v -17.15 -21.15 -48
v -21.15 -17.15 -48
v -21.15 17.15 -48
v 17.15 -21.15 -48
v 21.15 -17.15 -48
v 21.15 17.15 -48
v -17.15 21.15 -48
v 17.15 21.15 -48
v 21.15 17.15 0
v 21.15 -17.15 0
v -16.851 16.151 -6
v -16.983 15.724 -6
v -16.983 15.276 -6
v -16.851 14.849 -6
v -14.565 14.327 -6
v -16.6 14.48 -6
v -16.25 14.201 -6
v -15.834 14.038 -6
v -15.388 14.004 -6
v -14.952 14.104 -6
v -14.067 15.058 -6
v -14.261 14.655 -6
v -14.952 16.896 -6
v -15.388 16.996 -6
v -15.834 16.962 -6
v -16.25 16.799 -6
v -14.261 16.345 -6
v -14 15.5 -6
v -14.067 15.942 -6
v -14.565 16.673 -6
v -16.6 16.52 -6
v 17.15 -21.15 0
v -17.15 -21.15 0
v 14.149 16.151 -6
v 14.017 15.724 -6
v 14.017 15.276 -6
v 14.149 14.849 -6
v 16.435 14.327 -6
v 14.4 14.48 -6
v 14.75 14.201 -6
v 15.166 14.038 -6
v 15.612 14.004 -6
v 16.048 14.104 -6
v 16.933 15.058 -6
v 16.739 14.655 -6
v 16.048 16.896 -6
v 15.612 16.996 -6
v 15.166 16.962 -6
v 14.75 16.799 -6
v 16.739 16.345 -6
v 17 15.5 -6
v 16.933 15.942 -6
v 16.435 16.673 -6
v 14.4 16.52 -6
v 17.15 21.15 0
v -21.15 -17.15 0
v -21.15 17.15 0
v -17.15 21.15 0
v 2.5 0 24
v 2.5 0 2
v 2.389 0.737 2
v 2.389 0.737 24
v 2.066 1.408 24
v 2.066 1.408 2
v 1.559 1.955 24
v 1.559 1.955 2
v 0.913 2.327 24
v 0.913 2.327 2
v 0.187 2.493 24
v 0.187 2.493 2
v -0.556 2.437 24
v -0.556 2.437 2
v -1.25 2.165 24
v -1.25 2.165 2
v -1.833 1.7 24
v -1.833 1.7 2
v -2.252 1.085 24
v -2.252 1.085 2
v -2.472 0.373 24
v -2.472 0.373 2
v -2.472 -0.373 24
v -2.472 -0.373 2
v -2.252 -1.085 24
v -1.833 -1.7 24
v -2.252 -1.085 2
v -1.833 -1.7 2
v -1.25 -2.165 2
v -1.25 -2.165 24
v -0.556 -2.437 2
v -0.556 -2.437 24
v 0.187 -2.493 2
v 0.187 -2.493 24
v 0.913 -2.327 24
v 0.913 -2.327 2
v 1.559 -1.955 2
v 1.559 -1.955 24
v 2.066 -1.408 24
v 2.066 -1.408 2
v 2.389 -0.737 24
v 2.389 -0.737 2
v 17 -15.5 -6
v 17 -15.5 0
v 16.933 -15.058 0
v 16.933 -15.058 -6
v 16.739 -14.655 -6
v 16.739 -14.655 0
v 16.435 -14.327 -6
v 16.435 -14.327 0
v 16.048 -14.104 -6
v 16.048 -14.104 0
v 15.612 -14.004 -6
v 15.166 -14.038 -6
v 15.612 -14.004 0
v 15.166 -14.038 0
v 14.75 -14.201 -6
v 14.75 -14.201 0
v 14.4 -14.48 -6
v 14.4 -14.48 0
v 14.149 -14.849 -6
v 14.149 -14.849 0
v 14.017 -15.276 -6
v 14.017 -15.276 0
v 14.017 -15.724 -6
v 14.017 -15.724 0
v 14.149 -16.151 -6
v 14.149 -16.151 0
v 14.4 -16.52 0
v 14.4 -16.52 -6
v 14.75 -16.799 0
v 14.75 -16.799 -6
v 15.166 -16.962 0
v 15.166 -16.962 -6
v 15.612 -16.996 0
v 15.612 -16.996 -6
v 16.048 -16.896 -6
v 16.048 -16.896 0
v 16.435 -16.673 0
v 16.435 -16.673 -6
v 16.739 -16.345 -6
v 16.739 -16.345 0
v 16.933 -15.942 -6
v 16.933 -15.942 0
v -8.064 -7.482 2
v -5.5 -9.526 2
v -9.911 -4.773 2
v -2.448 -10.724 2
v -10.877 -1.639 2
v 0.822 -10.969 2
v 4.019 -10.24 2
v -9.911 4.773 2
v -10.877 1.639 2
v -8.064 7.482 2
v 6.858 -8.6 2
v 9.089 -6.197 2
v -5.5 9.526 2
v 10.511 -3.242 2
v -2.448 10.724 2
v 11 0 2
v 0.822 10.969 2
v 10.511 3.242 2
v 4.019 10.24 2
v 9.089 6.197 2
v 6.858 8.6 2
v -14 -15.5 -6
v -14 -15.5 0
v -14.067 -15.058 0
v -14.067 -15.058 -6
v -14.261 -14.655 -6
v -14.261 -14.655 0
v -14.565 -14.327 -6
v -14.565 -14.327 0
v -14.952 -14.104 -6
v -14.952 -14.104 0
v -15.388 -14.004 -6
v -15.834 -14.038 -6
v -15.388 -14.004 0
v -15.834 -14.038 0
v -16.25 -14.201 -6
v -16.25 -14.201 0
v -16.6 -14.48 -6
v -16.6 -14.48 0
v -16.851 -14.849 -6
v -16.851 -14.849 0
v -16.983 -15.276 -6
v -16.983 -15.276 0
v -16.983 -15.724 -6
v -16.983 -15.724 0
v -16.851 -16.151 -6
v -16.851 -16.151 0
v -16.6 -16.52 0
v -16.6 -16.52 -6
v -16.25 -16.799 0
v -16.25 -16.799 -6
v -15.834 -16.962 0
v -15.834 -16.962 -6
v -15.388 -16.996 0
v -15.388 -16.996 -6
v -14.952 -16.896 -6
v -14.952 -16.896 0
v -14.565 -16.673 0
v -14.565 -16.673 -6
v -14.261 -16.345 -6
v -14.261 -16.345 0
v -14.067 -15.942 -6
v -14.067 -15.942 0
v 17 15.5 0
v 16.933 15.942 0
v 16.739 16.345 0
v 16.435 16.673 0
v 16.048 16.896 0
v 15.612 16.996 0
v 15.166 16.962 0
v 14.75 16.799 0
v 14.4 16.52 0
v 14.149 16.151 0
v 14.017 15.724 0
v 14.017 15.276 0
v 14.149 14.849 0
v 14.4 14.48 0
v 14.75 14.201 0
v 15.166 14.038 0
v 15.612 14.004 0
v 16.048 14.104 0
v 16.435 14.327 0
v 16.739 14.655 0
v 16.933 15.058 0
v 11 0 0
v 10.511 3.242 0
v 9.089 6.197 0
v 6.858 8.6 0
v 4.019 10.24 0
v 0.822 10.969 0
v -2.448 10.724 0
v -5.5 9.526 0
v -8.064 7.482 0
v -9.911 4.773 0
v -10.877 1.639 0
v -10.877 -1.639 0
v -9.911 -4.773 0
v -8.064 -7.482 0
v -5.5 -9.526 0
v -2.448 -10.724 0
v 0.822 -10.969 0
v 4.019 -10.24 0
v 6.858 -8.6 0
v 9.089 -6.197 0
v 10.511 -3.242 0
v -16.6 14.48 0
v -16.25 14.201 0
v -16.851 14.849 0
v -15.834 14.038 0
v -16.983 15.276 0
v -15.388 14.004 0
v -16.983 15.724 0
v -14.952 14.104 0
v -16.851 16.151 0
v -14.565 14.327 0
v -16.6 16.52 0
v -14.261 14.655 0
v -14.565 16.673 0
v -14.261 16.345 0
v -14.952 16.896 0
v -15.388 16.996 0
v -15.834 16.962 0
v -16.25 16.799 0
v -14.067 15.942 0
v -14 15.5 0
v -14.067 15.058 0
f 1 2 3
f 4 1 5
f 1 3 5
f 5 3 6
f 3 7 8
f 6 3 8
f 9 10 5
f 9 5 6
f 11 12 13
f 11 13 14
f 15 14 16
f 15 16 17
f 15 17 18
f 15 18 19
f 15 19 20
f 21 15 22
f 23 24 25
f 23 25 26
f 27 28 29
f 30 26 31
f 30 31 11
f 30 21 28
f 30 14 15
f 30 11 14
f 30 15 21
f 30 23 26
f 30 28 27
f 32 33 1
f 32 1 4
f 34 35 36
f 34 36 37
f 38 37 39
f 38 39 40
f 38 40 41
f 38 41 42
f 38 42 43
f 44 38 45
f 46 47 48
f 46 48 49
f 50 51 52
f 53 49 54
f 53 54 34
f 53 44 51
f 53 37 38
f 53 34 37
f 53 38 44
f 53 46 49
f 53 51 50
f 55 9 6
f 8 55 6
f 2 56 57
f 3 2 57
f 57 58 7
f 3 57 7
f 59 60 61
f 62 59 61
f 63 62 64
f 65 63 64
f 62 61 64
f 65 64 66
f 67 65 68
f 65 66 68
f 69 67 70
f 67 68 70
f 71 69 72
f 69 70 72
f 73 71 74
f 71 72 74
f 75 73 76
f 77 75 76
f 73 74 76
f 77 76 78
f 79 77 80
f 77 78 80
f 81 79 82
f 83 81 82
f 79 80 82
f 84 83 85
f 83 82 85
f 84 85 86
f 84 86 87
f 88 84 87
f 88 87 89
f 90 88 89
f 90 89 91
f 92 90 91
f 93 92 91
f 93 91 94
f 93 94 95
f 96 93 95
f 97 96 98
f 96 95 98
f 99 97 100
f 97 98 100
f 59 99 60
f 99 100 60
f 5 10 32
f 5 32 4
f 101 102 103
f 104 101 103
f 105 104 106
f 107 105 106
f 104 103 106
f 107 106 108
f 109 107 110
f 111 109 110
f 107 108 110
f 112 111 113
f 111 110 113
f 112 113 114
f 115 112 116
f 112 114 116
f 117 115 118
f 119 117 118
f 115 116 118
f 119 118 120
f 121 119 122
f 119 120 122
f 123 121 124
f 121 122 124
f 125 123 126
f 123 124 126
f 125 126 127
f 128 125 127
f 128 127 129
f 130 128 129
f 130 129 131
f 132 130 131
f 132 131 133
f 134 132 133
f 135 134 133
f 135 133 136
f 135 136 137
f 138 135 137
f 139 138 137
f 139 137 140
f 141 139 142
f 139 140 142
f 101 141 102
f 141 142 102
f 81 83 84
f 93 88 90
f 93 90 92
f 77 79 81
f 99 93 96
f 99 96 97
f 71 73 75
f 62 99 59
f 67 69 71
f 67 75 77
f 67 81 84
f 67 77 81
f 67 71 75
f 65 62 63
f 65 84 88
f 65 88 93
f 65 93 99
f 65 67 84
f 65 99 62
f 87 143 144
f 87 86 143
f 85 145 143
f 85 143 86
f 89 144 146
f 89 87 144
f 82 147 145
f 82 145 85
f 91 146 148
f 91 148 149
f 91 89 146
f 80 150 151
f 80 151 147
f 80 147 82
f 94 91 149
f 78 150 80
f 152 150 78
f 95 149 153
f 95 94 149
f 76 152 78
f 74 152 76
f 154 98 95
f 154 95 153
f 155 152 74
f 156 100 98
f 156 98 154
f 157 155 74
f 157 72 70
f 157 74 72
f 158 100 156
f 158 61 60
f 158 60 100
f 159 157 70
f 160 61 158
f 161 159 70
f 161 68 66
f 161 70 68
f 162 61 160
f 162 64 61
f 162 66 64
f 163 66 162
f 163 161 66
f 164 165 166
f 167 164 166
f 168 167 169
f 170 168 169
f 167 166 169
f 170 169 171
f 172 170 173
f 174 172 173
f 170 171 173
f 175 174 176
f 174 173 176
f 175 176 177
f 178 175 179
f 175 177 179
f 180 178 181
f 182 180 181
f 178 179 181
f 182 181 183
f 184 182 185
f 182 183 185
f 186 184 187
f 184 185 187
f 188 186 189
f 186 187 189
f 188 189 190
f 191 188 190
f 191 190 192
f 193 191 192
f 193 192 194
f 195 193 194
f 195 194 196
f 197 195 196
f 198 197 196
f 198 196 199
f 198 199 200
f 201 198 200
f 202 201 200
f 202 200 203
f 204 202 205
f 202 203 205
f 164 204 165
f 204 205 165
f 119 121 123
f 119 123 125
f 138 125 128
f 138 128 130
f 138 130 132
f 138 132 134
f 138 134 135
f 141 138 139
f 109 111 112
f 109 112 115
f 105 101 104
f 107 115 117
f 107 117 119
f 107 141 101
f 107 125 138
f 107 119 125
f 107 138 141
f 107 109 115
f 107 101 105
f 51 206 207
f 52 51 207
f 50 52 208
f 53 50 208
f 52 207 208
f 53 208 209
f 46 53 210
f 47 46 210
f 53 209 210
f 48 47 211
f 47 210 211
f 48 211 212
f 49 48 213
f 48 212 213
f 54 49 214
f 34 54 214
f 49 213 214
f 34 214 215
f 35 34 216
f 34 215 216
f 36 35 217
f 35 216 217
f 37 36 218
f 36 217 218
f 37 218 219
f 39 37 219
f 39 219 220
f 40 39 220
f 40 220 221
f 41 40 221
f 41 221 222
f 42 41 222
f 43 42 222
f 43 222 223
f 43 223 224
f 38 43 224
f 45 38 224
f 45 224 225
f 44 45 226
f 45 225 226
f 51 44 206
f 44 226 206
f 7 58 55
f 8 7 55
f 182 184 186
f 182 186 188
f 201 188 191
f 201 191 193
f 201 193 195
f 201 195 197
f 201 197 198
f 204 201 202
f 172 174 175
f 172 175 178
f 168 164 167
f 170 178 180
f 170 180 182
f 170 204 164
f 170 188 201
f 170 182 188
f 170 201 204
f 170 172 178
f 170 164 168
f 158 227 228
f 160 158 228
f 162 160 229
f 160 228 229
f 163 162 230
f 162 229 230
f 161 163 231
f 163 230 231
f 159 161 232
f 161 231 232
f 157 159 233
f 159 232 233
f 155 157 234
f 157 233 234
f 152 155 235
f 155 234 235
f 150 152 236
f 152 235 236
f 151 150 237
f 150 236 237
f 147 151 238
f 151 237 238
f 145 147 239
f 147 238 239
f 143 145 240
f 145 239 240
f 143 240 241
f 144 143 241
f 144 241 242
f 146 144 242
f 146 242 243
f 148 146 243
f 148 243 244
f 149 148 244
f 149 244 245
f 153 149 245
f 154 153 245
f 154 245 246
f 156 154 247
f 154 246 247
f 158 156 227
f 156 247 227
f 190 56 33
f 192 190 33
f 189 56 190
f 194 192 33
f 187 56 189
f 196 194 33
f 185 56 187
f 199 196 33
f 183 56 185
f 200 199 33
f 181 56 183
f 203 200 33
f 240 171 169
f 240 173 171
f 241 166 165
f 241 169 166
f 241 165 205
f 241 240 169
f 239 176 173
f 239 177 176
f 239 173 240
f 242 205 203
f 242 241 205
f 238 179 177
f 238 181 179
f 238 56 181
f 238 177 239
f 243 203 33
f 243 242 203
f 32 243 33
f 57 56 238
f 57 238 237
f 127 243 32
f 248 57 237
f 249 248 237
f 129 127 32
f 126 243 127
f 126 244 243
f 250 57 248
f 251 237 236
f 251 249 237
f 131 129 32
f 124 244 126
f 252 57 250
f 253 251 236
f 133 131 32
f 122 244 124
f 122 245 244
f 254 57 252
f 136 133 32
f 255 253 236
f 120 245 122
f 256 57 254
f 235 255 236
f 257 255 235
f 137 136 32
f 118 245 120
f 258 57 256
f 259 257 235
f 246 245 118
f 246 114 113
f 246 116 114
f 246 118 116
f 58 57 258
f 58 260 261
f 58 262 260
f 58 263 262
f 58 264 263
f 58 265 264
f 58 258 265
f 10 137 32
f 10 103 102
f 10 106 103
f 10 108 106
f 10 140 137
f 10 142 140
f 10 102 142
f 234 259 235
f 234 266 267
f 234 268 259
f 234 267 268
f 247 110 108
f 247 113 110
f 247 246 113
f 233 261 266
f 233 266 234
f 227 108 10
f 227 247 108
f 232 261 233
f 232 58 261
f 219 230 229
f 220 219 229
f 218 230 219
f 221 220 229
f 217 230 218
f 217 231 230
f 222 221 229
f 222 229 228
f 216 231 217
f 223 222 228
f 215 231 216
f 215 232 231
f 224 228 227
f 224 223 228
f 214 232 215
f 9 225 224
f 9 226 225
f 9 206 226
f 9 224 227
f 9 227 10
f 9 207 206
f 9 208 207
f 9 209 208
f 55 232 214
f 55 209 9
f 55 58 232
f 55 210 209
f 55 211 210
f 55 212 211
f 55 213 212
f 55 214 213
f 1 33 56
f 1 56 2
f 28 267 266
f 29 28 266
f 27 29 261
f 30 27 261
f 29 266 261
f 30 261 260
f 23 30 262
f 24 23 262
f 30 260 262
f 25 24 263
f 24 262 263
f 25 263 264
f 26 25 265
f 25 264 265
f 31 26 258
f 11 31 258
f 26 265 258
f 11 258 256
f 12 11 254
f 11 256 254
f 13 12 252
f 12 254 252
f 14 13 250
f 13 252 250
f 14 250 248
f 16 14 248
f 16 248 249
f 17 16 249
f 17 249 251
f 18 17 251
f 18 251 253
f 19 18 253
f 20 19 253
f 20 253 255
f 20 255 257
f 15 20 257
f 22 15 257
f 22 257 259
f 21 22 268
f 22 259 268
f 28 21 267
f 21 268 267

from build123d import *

# Parameters (mm, degrees)
SKETCH1_W           = 42.3
SKETCH1_H           = 42.3
BOSS_EXTRUDE1_DEPTH = 48
SKETCH2_R           = 1.5
CUT_EXTRUDE1_DEPTH  = 6
SKETCH3_R           = 11
BOSS_EXTRUDE2_DEPTH = 2
SKETCH4_R           = 2.5
BOSS_EXTRUDE3_DEPTH = 22
CHAMFER1_SIZE       = 4


with BuildPart() as part:
    # Sketch1 → Boss-Extrude1 (new body)
    with BuildSketch(Plane.XY):
        Rectangle(SKETCH1_W, SKETCH1_H)
    extrude(amount=-BOSS_EXTRUDE1_DEPTH)

    # Sketch2 → Cut-Extrude1 (cut)
    with BuildSketch(Plane.XY):
        with Locations((-15.5, 15.5)):
            Circle(SKETCH2_R)
        with Locations((15.5, 15.5)):
            Circle(SKETCH2_R)
        with Locations((15.5, -15.5)):
            Circle(SKETCH2_R)
        with Locations((-15.5, -15.5)):
            Circle(SKETCH2_R)
    extrude(amount=-CUT_EXTRUDE1_DEPTH, mode=Mode.SUBTRACT)

    # Sketch3 → Boss-Extrude2 (add)
    with BuildSketch(Plane.XY):
        Circle(SKETCH3_R)
    extrude(amount=BOSS_EXTRUDE2_DEPTH)

    # Sketch4 → Boss-Extrude3 (add)
    with BuildSketch(Plane.XY.offset(2)):
        Circle(SKETCH4_R)
    extrude(amount=BOSS_EXTRUDE3_DEPTH)

    # Chamfer1
    chamfer1_edges = [part.edges().sort_by_distance(p)[0] for p in [
        (21.15, -21.15, -24),
        (-21.15, -21.15, -24),
        (-21.15, 21.15, -24),
        (21.15, 21.15, -24),
    ]]
    chamfer(chamfer1_edges, length=CHAMFER1_SIZE)


solid = part.part
